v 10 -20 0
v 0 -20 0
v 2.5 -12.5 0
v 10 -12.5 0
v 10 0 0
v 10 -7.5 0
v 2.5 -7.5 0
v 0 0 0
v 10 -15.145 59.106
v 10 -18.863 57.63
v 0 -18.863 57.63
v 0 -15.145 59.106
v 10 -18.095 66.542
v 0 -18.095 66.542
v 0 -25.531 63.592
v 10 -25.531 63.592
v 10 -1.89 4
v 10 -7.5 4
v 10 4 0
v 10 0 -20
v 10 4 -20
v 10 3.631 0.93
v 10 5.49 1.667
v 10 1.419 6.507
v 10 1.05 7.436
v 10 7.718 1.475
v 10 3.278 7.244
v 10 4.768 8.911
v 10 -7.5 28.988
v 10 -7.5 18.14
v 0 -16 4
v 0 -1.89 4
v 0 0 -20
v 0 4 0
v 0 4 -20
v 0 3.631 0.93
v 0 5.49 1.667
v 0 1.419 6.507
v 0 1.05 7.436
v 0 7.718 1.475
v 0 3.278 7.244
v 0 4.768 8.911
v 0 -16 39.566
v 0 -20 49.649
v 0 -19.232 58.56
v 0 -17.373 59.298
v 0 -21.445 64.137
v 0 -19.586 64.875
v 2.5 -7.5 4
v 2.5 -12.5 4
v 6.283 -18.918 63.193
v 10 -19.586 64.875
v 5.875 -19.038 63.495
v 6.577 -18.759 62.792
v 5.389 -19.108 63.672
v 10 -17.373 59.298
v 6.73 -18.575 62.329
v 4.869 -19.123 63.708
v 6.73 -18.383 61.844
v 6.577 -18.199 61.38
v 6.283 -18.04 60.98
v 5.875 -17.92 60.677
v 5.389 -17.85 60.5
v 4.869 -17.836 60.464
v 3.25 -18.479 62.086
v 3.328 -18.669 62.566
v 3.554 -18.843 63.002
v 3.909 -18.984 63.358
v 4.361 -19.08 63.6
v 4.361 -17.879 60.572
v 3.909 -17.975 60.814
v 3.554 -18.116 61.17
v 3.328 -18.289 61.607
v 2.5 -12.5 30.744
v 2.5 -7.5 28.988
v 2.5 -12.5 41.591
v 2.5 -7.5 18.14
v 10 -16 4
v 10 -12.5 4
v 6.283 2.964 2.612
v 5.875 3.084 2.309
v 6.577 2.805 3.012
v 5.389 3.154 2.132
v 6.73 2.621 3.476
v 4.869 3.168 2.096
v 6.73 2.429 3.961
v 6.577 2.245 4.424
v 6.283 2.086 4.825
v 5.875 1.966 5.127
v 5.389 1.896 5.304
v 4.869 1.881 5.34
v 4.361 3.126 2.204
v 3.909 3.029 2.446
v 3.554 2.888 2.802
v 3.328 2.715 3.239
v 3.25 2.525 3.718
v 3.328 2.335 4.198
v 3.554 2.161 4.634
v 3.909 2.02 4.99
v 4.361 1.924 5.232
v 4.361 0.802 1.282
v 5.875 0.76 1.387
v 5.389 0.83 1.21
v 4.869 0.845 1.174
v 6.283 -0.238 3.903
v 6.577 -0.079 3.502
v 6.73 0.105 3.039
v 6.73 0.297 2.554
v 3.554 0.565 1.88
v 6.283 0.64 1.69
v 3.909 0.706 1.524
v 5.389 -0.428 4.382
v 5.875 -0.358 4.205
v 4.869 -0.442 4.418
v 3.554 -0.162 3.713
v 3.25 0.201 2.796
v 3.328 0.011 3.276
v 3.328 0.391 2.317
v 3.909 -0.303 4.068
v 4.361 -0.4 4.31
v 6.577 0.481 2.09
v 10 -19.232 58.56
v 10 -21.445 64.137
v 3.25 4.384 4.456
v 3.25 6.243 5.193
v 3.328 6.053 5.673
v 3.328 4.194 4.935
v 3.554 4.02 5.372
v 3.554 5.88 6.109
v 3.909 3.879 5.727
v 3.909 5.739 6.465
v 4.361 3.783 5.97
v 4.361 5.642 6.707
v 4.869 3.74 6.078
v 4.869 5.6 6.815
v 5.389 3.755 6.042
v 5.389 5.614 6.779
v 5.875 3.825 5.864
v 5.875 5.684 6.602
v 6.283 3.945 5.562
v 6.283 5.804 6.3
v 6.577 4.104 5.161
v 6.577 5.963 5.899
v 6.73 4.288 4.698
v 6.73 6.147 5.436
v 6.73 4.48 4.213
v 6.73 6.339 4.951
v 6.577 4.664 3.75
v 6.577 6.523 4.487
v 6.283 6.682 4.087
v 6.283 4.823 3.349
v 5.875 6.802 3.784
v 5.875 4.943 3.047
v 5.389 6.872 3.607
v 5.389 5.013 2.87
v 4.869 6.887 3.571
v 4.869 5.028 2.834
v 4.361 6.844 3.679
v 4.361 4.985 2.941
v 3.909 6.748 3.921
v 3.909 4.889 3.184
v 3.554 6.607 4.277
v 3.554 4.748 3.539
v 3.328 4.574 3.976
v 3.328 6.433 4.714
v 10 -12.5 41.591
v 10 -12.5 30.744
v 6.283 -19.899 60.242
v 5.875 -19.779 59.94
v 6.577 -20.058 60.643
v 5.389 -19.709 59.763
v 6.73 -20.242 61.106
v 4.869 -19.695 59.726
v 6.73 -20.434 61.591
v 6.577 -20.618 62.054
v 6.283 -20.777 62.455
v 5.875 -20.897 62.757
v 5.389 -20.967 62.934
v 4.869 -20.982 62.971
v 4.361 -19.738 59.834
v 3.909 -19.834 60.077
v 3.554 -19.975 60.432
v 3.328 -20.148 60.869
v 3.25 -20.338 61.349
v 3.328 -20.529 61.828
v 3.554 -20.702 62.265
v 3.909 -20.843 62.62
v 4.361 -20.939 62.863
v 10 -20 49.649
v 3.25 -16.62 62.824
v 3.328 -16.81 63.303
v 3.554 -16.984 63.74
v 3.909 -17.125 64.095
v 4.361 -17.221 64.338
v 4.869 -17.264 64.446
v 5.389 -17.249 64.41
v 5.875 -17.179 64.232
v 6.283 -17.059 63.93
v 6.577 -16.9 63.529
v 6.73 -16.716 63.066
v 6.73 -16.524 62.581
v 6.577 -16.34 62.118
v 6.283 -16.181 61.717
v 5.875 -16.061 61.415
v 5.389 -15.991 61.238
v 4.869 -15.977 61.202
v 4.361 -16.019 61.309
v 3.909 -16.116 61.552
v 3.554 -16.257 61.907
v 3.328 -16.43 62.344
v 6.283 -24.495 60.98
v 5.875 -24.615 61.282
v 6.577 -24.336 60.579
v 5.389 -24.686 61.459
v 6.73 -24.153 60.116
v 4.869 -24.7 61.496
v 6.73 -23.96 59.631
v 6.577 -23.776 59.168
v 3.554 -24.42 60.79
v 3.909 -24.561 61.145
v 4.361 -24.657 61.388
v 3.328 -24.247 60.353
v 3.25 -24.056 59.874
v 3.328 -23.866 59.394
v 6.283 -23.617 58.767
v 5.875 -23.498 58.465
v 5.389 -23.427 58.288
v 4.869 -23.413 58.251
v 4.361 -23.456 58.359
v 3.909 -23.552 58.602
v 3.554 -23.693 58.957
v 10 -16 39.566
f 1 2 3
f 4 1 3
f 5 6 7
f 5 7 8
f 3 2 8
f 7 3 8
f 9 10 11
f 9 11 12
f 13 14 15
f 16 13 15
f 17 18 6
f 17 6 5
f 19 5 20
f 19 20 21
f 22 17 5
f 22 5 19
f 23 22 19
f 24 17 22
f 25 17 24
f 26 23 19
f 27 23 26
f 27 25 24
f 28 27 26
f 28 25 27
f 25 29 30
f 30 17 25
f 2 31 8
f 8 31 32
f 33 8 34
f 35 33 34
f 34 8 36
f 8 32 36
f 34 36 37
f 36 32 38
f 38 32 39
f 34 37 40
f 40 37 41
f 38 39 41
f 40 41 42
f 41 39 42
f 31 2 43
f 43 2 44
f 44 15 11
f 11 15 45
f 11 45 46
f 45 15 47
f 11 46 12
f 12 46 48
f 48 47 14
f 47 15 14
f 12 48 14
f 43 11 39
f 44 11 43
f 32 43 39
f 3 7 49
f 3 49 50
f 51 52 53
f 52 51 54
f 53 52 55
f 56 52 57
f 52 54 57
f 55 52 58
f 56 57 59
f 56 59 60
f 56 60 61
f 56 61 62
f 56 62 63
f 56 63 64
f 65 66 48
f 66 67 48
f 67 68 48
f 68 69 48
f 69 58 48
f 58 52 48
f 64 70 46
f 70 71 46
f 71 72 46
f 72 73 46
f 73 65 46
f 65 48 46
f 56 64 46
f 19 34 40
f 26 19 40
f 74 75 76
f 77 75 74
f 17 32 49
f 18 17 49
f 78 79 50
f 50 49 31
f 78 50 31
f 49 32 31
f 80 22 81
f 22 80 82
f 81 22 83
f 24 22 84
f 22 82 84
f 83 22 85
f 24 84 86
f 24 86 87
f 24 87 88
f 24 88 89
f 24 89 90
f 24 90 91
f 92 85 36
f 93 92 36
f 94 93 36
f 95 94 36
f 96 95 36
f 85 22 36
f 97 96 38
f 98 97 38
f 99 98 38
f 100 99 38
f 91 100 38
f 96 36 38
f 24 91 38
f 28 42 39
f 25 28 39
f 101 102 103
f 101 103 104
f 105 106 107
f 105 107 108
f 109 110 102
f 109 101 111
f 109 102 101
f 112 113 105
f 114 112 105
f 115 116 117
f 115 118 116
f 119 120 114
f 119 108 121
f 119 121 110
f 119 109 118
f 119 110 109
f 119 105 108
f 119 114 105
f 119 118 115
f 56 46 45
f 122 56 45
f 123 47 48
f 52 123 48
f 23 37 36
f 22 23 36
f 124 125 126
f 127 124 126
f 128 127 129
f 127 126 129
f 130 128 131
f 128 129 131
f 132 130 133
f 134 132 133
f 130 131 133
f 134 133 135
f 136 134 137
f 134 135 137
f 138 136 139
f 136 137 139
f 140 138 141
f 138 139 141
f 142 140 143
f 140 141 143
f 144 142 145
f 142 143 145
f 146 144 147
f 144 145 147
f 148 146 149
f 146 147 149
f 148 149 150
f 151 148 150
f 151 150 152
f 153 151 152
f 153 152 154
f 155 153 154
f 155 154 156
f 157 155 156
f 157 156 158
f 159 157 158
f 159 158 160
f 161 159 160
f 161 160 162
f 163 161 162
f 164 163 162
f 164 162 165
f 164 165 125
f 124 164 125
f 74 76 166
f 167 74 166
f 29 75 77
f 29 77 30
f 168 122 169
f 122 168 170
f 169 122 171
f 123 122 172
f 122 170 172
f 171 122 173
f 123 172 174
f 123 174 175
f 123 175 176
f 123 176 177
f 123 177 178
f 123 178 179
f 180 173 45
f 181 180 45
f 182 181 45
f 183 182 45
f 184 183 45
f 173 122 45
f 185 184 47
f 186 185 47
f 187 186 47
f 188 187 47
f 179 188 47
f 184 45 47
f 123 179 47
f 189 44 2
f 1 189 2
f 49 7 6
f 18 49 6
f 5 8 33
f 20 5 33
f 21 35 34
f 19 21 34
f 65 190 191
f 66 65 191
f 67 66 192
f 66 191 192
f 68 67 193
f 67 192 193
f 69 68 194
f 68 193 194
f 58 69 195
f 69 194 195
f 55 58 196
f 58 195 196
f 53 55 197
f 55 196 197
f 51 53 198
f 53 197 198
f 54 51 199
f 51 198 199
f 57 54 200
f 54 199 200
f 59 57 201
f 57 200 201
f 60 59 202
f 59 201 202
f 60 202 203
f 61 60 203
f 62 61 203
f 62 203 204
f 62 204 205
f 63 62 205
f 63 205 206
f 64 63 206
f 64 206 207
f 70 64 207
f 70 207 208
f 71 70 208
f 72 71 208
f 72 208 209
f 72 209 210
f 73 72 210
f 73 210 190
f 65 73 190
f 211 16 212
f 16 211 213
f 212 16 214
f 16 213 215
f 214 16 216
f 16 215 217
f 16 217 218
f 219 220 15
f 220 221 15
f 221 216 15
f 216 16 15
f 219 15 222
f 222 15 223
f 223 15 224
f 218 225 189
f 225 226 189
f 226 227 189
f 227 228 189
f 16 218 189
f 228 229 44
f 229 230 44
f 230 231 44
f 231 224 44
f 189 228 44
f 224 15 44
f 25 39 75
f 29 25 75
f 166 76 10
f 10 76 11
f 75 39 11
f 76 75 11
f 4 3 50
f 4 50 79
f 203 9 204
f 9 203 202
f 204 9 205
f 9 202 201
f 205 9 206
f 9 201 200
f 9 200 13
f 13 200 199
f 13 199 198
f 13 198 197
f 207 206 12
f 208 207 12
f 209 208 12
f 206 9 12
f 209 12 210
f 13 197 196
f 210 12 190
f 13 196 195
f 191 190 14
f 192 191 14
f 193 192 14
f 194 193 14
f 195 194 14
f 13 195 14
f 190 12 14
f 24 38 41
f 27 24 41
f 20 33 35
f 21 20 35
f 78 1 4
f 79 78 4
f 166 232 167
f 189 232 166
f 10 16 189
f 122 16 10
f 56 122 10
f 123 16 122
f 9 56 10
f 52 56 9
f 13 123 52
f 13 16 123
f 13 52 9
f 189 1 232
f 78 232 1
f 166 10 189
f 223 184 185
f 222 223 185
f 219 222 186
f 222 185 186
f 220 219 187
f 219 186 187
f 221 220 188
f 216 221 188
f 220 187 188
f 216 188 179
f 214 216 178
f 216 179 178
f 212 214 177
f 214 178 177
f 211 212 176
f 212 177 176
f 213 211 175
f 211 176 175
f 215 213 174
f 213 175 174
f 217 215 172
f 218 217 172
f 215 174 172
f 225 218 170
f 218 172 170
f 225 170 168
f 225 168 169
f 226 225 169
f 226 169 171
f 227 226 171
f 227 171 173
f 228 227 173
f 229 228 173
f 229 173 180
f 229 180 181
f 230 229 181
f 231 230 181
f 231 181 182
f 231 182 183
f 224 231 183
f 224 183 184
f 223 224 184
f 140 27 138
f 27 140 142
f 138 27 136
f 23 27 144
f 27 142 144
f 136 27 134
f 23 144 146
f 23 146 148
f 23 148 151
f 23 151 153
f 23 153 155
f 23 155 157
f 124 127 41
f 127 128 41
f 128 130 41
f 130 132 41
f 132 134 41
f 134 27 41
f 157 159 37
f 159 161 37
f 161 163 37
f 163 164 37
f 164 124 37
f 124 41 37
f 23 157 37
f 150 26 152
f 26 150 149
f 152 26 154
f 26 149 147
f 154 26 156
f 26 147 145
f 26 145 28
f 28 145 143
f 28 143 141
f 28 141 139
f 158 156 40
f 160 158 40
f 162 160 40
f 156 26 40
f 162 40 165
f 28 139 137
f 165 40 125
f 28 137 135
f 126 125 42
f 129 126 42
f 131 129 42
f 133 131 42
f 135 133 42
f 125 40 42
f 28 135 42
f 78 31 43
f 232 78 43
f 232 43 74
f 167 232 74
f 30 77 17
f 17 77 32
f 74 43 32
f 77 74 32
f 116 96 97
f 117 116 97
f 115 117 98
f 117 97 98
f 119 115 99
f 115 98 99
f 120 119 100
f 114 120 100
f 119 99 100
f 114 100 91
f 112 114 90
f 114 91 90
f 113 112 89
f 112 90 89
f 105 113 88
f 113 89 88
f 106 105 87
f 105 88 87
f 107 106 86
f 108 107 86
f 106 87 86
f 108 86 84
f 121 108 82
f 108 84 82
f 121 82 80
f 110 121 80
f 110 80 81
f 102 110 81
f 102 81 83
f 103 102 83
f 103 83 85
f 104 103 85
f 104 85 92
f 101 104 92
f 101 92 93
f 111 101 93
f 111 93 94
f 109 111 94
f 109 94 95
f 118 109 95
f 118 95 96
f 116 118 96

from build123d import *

# Parameters (mm, degrees)
F1_DEPTH = 10
F2_R     = 1.75
F3_DEPTH = 25
F4_R     = 1.75
F5_DEPTH = 6.5
F6_W     = 7.5
F6_H     = 5
F7_DEPTH = 52.6


with BuildPart() as f1:
    # F0 (on Right) → F1 (new body)
    with BuildSketch(Plane.YZ):
        Polygon((-20, 49.6487663492), (-20, 0), (0, 0), (0, -20), (4, -20), (4, 0), (3.6312381011, 0.9295238899), (1.4186667076, 6.5066672293), (1.0499048087, 7.4361911193), (-18.8632377328, 57.6304811742), (-19.2319996317, 58.5600050641), (-21.4445710252, 64.1371484036), (-21.8133329241, 65.0666722935), (-25.5314284837, 63.5916246978), align=None)
        Polygon((-16, 4), (-16, 39.5661206894), (-1.8901633999, 4), align=None, mode=Mode.SUBTRACT)
        Polygon((-18.0952373645, 66.5417198892), (-21.8133329241, 65.0666722935), (-21.4445710252, 64.1371484036), (-19.5855232454, 64.8746722014), (-17.3729518519, 59.297528862), (-19.2319996317, 58.5600050641), (-18.8632377328, 57.6304811742), (-15.1451421732, 59.1055287699), align=None)
        Polygon((3.6312381011, 0.9295238899), (4, 0), (7.7180955596, 1.4750475957), (4.7680003683, 8.9112387149), (1.0499048087, 7.4361911193), (1.4186667076, 6.5066672293), (3.2777144874, 7.2441910272), (5.4902858809, 1.6670476877), align=None)
    extrude(amount=F1_DEPTH)

    # F2 (on face) → F3 (cut)
    with BuildSketch(Plane(origin=(0, 7.1741542073, 2.8461395746), x_dir=(-1, 0, 0), z_dir=(0, 0.9295238899, 0.3687618989))):
        with Locations((-5, 64.5249524043)):
            Circle(F2_R)
    extrude(amount=-F3_DEPTH, mode=Mode.SUBTRACT)

    # F4 (on face) → F5 (cut)
    with BuildSketch(Plane(origin=(0, 7.1741542073, 2.8461395746), x_dir=(-1, 0, 0), z_dir=(0, 0.9295238899, 0.3687618989))):
        with Locations((-5, 2.5249524043)):
            Circle(F4_R)
    extrude(amount=-F5_DEPTH, mode=Mode.SUBTRACT)

    # F6 (on face) → F7 (cut)
    with BuildSketch(Plane(origin=(0, 0, 0), x_dir=(1, 0, 0), z_dir=(0, 0, -1))):
        with Locations((6.25, 10)):
            Rectangle(F6_W, F6_H)
    extrude(amount=-F7_DEPTH, mode=Mode.SUBTRACT)


solid = f1.part
